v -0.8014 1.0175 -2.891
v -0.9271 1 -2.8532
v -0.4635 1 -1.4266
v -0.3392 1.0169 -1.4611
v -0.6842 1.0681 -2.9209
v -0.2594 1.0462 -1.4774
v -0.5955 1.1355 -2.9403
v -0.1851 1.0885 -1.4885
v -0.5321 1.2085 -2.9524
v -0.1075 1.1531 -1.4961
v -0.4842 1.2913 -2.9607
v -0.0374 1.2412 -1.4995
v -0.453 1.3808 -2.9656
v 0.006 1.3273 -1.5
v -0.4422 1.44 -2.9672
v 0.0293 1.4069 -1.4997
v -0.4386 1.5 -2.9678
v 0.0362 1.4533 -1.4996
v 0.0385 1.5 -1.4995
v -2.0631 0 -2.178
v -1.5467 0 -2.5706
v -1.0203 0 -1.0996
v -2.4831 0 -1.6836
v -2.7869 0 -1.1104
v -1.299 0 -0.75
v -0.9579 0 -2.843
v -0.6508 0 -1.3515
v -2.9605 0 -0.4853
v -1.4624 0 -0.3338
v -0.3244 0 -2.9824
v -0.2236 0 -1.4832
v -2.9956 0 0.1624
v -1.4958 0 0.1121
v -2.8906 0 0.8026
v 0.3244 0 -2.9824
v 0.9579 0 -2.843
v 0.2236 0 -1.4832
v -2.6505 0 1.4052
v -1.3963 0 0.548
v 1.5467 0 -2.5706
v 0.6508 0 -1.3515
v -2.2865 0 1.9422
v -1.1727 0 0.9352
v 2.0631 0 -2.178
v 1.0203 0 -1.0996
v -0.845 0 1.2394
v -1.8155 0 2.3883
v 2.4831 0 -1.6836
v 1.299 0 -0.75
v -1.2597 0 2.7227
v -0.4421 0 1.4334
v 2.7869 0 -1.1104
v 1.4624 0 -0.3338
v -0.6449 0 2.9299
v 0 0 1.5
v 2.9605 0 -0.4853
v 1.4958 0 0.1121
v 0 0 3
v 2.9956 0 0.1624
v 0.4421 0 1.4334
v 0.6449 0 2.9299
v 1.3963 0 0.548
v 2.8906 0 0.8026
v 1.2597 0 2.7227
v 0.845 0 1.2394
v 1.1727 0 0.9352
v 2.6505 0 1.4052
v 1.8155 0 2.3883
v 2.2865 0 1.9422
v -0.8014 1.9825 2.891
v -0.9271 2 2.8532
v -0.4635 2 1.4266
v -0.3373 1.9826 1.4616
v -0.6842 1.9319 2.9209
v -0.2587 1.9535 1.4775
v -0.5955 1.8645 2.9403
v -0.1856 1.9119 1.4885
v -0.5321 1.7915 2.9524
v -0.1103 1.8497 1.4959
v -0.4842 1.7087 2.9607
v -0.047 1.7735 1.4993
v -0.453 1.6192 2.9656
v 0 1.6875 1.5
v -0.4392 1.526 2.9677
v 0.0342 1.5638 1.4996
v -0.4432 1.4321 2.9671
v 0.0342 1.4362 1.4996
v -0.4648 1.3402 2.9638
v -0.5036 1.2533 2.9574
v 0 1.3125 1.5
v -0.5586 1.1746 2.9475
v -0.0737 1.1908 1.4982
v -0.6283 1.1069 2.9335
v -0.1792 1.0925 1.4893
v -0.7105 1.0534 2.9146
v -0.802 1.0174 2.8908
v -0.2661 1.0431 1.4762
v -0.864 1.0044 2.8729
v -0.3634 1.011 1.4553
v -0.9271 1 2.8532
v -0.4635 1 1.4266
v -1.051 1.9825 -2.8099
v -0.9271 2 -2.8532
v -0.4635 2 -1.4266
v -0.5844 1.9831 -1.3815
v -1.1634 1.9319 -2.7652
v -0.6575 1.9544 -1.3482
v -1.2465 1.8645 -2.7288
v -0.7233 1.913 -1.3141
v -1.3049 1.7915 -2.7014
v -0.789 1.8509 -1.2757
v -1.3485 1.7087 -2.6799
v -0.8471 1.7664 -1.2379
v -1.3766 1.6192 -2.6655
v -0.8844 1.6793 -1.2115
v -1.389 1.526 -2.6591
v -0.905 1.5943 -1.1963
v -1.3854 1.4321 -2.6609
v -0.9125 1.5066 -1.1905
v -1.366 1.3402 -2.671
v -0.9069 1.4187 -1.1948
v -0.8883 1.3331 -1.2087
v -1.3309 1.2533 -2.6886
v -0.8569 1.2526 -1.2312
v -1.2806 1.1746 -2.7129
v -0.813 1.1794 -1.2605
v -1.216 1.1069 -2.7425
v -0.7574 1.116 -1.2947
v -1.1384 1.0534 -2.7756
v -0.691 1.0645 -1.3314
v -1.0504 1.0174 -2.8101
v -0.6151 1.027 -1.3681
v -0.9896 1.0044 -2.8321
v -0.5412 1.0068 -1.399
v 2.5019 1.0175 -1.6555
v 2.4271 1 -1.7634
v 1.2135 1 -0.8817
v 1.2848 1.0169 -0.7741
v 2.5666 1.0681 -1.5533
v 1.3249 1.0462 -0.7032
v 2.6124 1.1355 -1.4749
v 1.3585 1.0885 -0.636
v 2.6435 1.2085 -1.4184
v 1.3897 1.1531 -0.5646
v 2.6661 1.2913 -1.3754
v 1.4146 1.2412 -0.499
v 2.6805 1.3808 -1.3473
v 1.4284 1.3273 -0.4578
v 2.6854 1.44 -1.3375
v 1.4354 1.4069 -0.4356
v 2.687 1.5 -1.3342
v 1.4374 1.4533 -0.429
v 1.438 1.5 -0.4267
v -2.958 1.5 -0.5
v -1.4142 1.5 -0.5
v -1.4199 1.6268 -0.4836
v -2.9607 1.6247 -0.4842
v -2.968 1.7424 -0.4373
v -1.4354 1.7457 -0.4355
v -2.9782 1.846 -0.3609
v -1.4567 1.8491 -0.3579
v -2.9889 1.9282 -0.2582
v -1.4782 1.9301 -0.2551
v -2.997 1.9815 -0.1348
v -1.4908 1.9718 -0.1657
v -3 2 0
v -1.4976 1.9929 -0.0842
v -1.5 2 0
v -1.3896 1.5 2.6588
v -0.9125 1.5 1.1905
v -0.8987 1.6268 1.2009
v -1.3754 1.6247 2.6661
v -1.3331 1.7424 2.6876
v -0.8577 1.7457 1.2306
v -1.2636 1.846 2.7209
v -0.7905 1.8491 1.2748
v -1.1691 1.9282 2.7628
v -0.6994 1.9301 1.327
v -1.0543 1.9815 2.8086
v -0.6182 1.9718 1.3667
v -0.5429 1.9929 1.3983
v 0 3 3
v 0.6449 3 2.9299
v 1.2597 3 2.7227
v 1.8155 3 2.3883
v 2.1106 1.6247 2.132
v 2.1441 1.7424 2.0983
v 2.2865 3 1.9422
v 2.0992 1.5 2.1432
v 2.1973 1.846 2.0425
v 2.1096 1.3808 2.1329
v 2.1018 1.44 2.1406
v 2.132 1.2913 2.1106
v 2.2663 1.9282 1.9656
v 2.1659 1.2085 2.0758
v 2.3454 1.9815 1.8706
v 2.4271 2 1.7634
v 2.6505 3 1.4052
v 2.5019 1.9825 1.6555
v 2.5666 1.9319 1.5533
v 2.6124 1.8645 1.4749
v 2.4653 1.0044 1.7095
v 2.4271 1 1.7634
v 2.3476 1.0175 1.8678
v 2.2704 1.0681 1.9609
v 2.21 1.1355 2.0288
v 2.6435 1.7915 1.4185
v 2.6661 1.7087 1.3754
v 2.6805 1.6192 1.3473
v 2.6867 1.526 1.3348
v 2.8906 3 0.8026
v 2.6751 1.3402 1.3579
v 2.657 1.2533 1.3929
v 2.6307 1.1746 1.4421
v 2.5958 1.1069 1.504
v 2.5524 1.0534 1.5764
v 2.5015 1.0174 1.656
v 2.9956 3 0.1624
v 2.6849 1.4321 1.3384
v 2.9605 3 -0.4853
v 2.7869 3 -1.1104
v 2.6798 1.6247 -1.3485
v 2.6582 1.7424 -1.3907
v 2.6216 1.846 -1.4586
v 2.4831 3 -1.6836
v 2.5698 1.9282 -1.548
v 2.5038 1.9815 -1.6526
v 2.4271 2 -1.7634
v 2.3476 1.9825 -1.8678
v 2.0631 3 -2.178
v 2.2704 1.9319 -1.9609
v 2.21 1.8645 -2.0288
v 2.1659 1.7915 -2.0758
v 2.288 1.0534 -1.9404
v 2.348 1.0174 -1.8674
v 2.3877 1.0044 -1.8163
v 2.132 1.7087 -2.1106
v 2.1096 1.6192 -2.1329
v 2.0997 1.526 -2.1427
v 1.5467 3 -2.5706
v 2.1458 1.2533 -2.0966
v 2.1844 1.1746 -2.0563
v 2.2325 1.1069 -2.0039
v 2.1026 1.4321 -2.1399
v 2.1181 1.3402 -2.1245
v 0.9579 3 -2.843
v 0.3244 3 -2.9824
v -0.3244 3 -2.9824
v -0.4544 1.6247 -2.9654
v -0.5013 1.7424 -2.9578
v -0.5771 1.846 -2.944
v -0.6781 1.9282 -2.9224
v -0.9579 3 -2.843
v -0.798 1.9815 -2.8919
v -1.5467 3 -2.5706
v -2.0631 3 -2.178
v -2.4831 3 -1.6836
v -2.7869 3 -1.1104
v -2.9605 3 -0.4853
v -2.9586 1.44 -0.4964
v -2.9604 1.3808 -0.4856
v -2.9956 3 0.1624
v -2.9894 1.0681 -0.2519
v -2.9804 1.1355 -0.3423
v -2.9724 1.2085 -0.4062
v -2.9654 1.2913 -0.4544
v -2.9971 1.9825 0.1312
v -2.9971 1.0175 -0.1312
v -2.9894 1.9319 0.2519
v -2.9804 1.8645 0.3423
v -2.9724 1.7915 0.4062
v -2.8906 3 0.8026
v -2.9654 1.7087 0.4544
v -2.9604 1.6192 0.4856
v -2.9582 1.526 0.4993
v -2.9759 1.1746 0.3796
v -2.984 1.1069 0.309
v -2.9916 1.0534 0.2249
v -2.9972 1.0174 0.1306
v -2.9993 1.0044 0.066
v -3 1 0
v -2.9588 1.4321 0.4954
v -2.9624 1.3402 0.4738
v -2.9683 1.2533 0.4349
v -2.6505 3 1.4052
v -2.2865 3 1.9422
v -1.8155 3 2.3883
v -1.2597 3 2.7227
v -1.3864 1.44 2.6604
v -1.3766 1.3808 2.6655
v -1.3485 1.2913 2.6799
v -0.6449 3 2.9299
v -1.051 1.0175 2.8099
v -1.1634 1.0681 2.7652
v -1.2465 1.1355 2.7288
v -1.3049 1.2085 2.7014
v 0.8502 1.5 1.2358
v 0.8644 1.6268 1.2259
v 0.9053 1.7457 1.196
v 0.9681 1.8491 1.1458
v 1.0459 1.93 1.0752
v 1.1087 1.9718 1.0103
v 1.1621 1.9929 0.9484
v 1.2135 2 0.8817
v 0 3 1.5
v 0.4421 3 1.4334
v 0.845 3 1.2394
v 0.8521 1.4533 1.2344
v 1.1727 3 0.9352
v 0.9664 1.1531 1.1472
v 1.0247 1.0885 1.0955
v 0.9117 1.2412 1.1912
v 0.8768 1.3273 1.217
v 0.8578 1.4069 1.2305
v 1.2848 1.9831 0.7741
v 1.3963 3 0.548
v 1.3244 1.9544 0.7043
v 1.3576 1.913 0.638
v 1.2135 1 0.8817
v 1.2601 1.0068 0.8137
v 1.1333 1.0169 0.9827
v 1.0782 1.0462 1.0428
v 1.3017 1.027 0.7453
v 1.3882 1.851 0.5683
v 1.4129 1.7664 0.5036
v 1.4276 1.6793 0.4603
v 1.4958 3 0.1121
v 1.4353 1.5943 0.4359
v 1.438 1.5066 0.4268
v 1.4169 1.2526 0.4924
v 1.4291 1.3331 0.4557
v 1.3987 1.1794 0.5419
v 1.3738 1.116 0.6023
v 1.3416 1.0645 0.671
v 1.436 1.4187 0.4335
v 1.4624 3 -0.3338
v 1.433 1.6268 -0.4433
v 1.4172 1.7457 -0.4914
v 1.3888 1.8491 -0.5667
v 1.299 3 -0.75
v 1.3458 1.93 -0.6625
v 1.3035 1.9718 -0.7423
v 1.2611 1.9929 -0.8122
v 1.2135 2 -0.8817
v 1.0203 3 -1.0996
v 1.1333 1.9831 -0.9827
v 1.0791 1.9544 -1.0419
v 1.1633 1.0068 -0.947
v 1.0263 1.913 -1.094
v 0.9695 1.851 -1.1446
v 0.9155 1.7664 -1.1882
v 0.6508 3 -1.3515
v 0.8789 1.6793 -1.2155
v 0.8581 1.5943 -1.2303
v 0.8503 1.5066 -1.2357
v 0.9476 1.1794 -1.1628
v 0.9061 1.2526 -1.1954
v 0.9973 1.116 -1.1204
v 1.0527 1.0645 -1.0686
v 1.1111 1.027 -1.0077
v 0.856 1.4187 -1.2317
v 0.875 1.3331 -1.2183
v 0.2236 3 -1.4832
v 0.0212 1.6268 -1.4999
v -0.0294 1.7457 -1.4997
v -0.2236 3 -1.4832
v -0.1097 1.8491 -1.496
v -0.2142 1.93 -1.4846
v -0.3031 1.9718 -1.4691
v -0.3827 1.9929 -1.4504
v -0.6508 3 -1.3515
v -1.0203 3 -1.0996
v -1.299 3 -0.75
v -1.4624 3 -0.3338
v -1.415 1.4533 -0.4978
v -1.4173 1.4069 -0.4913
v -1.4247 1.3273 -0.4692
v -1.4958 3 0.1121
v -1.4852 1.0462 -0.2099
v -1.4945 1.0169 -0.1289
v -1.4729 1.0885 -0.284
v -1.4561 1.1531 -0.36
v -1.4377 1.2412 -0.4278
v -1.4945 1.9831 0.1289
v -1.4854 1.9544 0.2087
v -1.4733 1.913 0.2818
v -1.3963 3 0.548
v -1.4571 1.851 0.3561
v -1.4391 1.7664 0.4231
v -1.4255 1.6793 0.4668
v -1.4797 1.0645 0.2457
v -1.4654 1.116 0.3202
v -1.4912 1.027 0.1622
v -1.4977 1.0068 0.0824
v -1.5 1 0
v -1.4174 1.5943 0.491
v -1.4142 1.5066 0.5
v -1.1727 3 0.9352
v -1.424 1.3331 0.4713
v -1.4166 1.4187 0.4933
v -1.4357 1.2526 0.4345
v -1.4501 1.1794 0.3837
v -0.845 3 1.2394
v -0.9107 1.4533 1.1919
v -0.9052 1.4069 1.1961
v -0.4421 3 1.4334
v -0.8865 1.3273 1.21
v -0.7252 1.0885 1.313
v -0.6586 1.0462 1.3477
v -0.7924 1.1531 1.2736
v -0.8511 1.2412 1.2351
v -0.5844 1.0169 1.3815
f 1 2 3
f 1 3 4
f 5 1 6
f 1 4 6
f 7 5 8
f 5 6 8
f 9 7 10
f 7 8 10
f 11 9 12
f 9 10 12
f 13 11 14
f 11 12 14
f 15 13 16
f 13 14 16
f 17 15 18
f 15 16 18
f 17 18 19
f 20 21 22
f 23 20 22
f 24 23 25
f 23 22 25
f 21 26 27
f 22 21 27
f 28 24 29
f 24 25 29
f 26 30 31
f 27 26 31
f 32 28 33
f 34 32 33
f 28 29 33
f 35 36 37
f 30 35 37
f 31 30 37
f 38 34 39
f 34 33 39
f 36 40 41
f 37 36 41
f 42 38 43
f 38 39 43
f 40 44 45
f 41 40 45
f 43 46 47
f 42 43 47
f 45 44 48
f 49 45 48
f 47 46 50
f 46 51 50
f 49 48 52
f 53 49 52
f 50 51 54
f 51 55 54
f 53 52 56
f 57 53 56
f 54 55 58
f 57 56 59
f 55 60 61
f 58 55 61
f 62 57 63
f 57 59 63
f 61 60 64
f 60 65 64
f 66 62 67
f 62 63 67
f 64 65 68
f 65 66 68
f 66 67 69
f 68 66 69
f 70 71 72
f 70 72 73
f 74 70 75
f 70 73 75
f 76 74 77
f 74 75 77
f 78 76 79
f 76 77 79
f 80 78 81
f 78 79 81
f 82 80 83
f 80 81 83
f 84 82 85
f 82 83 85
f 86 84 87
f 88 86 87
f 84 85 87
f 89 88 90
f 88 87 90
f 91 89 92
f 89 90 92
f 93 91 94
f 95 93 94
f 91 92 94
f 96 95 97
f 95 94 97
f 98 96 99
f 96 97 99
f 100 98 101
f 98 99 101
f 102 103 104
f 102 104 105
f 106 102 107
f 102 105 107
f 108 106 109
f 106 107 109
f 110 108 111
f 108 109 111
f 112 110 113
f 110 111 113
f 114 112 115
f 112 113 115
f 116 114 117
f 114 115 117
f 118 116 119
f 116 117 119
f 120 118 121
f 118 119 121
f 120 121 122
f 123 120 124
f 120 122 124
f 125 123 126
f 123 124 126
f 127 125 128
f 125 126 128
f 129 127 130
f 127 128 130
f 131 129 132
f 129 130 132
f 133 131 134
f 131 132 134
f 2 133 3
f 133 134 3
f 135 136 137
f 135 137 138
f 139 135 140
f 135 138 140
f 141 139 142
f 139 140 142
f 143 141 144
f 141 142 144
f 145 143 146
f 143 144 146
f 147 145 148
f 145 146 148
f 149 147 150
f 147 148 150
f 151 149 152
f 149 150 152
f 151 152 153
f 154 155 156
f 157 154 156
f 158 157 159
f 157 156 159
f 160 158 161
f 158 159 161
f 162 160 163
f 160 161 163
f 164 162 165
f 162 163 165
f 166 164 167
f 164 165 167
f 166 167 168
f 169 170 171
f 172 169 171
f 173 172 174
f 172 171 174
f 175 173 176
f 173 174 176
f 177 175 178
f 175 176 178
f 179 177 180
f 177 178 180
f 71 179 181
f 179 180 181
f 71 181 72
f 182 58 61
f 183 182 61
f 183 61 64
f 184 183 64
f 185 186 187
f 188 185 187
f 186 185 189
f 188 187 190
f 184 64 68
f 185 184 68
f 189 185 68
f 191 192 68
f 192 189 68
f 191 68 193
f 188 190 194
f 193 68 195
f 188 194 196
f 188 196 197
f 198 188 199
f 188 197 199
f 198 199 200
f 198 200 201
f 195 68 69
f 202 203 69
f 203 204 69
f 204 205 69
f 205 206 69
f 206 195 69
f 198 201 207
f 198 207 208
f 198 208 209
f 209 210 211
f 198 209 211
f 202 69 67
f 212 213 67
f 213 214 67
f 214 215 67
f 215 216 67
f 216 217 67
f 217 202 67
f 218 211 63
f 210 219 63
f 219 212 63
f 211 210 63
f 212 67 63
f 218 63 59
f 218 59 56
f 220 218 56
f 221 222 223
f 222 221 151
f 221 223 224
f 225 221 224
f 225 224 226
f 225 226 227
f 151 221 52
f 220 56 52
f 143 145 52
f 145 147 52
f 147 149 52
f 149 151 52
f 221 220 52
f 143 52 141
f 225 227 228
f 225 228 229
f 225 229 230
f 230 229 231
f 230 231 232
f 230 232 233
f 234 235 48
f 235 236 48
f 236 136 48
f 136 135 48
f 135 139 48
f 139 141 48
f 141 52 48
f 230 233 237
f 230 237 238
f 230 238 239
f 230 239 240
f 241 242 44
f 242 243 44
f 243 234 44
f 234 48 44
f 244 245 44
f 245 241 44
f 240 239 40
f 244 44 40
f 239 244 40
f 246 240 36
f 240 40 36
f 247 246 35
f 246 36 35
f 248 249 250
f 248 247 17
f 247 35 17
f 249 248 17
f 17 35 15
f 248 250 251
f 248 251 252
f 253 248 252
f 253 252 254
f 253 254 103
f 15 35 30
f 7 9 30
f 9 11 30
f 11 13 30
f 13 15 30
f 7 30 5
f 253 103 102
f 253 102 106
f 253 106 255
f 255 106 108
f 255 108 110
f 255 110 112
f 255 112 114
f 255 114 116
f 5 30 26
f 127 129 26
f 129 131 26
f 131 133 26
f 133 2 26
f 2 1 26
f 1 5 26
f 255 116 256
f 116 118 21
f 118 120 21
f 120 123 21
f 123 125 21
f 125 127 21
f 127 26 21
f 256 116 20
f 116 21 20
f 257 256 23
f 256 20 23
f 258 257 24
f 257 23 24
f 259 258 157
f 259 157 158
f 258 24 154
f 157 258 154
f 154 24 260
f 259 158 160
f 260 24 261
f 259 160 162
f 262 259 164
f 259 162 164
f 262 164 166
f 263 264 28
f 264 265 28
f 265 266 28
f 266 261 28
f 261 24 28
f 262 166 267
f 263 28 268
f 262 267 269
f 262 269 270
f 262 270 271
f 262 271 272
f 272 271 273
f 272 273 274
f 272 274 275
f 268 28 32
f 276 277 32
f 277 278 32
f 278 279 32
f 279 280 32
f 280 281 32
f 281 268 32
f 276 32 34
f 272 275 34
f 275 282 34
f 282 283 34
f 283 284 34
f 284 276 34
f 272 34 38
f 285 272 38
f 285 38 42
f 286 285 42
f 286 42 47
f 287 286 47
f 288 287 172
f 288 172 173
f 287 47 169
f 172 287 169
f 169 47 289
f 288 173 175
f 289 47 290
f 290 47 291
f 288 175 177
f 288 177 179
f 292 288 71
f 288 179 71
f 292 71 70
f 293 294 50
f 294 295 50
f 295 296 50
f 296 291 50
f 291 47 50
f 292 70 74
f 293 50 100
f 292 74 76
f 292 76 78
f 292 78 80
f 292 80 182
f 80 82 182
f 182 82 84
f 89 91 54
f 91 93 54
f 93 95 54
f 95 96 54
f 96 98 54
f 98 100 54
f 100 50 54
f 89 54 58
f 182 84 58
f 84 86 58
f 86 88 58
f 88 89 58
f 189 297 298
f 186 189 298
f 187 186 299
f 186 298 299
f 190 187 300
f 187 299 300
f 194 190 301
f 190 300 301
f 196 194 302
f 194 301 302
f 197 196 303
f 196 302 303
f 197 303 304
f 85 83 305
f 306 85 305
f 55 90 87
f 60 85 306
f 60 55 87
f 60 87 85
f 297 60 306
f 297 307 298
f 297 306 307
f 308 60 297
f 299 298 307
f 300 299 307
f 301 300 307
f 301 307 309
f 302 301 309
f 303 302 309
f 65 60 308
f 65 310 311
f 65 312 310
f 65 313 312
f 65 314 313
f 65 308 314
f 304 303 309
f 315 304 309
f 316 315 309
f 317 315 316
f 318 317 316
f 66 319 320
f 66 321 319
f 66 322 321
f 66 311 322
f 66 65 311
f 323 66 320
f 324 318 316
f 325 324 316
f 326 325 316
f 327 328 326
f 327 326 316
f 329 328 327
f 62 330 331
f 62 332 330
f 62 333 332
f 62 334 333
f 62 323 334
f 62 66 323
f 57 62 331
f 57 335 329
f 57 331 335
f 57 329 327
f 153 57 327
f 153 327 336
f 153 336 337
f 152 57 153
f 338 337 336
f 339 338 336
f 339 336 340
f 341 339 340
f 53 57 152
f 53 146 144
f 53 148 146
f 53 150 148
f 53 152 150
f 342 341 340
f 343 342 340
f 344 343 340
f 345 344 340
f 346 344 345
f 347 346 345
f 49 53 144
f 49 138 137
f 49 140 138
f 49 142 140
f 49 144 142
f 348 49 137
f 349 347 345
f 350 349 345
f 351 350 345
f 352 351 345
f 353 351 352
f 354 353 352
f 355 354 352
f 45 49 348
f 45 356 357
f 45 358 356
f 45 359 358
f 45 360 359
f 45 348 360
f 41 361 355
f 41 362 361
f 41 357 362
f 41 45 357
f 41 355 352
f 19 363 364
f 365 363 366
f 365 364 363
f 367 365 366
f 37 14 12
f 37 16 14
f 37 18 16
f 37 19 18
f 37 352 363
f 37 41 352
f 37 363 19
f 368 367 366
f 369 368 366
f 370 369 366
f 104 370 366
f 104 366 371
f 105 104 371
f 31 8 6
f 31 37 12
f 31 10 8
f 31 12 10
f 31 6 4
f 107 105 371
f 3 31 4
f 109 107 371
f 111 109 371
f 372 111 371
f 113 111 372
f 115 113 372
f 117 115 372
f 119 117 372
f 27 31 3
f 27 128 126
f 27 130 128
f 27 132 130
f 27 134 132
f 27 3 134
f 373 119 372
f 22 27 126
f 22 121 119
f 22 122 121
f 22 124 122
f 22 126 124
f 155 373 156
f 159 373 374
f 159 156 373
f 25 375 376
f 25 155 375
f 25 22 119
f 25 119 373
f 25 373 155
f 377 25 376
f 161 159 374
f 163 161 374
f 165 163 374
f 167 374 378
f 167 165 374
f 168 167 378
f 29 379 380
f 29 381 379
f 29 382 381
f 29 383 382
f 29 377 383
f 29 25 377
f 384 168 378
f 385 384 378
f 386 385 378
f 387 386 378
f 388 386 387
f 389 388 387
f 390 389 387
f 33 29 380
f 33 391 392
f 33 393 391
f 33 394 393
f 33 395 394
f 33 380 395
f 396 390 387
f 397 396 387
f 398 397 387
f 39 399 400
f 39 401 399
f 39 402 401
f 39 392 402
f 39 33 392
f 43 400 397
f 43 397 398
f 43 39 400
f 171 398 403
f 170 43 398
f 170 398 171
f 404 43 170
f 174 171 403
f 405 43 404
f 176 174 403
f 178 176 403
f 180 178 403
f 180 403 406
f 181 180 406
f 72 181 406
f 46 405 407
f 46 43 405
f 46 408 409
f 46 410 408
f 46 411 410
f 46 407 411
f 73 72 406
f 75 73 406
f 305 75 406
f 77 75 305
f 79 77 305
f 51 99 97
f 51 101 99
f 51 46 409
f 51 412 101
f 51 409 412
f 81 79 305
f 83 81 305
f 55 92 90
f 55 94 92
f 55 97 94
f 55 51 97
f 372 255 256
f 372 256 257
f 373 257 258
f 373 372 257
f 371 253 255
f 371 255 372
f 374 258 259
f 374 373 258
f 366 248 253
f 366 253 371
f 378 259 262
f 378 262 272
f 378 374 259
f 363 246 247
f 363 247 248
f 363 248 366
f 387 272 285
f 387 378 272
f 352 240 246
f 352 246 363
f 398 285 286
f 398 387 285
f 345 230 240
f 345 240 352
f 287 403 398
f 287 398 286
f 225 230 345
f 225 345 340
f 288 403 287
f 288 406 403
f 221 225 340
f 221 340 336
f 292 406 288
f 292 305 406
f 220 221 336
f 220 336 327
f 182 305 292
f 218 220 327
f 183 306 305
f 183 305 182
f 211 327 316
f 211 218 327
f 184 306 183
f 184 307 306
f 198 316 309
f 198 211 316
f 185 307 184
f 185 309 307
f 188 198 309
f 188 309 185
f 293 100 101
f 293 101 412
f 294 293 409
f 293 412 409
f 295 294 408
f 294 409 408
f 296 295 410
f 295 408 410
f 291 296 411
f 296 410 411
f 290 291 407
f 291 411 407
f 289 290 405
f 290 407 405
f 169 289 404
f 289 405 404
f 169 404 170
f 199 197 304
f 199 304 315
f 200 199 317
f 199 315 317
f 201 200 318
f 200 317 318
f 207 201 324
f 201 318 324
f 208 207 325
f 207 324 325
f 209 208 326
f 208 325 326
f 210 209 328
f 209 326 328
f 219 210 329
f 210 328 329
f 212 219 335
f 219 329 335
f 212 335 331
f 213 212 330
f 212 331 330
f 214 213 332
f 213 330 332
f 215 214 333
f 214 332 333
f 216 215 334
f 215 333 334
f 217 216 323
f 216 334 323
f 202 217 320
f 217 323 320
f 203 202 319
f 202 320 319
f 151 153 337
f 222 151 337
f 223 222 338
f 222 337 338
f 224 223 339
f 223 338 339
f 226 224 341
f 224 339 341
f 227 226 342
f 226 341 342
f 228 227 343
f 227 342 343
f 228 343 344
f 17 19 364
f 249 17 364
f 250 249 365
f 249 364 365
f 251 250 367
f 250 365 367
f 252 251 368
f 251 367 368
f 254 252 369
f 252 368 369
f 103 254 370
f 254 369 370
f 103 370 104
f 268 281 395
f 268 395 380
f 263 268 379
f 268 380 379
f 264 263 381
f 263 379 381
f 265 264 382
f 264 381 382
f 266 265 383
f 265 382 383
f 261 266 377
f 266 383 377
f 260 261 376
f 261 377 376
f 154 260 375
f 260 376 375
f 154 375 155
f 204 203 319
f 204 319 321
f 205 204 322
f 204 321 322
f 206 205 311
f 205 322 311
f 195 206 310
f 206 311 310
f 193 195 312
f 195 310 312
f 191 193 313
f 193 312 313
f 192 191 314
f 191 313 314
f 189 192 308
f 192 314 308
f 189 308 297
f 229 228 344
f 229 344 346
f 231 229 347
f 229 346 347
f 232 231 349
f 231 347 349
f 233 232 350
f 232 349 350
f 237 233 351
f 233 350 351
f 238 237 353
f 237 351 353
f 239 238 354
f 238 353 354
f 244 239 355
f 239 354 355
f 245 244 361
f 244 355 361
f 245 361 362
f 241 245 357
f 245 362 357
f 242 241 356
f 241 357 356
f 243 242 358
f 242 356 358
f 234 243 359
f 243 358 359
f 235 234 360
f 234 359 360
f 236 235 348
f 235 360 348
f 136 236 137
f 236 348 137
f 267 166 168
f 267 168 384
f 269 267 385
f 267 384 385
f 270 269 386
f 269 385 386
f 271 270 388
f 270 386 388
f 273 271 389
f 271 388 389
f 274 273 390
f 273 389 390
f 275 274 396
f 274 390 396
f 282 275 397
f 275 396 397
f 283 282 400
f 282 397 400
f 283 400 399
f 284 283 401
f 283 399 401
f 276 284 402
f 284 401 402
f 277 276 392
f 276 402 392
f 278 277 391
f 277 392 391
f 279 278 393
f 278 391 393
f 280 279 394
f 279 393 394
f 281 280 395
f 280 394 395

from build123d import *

# Parameters (mm, degrees)
SKETCH1_R           = 3
SKETCH1_R_2         = 1.5
BOSS_EXTRUDE1_DEPTH = 3
CUT_EXTRUDE1_DEPTH  = 3
CIRPATTERN1_COUNT   = 5


with BuildPart() as part:
    # Sketch1 → Boss-Extrude1 (new body)
    with BuildSketch(Plane(origin=(0, 0, 0), x_dir=(1, 0, 0), z_dir=(0, 1, 0))):
        with Locations(Location((0, 0, 0), (0, 0, 270))):
            Circle(SKETCH1_R)
        with Locations(Location((0, 0, 0), (0, 0, 270))):
            Circle(SKETCH1_R_2, mode=Mode.SUBTRACT)
    extrude(amount=BOSS_EXTRUDE1_DEPTH)

    # Sketch2 → Cut-Extrude1 (cut)
    with BuildSketch(Plane(origin=(0, 0, 0), x_dir=(0, 0, -1), z_dir=(1, 0, 0))):
        with BuildLine():
            ThreePointArc((0, 2), (-0.5, 1.5), (0, 1))
            Line((0, 1), (0, 2))
        make_face()
        with BuildLine():
            Line((0, 2), (0, 1))
            ThreePointArc((0, 1), (0.353553391, 1.146446609), (0.5, 1.5))
            ThreePointArc((0.5, 1.5), (0.353553391, 1.853553391), (0, 2))
        make_face()
    cut_extrude1 = extrude(amount=-CUT_EXTRUDE1_DEPTH, mode=Mode.SUBTRACT)

    # CirPattern1: Cut-Extrude1 ×5 about axis
    cirpattern1_axis = Axis((0, 0, 0), (0, 1, 0))
    for i in range(1, CIRPATTERN1_COUNT):
        add(cut_extrude1.rotate(cirpattern1_axis, i * 360 / CIRPATTERN1_COUNT), mode=Mode.SUBTRACT)


solid = part.part
